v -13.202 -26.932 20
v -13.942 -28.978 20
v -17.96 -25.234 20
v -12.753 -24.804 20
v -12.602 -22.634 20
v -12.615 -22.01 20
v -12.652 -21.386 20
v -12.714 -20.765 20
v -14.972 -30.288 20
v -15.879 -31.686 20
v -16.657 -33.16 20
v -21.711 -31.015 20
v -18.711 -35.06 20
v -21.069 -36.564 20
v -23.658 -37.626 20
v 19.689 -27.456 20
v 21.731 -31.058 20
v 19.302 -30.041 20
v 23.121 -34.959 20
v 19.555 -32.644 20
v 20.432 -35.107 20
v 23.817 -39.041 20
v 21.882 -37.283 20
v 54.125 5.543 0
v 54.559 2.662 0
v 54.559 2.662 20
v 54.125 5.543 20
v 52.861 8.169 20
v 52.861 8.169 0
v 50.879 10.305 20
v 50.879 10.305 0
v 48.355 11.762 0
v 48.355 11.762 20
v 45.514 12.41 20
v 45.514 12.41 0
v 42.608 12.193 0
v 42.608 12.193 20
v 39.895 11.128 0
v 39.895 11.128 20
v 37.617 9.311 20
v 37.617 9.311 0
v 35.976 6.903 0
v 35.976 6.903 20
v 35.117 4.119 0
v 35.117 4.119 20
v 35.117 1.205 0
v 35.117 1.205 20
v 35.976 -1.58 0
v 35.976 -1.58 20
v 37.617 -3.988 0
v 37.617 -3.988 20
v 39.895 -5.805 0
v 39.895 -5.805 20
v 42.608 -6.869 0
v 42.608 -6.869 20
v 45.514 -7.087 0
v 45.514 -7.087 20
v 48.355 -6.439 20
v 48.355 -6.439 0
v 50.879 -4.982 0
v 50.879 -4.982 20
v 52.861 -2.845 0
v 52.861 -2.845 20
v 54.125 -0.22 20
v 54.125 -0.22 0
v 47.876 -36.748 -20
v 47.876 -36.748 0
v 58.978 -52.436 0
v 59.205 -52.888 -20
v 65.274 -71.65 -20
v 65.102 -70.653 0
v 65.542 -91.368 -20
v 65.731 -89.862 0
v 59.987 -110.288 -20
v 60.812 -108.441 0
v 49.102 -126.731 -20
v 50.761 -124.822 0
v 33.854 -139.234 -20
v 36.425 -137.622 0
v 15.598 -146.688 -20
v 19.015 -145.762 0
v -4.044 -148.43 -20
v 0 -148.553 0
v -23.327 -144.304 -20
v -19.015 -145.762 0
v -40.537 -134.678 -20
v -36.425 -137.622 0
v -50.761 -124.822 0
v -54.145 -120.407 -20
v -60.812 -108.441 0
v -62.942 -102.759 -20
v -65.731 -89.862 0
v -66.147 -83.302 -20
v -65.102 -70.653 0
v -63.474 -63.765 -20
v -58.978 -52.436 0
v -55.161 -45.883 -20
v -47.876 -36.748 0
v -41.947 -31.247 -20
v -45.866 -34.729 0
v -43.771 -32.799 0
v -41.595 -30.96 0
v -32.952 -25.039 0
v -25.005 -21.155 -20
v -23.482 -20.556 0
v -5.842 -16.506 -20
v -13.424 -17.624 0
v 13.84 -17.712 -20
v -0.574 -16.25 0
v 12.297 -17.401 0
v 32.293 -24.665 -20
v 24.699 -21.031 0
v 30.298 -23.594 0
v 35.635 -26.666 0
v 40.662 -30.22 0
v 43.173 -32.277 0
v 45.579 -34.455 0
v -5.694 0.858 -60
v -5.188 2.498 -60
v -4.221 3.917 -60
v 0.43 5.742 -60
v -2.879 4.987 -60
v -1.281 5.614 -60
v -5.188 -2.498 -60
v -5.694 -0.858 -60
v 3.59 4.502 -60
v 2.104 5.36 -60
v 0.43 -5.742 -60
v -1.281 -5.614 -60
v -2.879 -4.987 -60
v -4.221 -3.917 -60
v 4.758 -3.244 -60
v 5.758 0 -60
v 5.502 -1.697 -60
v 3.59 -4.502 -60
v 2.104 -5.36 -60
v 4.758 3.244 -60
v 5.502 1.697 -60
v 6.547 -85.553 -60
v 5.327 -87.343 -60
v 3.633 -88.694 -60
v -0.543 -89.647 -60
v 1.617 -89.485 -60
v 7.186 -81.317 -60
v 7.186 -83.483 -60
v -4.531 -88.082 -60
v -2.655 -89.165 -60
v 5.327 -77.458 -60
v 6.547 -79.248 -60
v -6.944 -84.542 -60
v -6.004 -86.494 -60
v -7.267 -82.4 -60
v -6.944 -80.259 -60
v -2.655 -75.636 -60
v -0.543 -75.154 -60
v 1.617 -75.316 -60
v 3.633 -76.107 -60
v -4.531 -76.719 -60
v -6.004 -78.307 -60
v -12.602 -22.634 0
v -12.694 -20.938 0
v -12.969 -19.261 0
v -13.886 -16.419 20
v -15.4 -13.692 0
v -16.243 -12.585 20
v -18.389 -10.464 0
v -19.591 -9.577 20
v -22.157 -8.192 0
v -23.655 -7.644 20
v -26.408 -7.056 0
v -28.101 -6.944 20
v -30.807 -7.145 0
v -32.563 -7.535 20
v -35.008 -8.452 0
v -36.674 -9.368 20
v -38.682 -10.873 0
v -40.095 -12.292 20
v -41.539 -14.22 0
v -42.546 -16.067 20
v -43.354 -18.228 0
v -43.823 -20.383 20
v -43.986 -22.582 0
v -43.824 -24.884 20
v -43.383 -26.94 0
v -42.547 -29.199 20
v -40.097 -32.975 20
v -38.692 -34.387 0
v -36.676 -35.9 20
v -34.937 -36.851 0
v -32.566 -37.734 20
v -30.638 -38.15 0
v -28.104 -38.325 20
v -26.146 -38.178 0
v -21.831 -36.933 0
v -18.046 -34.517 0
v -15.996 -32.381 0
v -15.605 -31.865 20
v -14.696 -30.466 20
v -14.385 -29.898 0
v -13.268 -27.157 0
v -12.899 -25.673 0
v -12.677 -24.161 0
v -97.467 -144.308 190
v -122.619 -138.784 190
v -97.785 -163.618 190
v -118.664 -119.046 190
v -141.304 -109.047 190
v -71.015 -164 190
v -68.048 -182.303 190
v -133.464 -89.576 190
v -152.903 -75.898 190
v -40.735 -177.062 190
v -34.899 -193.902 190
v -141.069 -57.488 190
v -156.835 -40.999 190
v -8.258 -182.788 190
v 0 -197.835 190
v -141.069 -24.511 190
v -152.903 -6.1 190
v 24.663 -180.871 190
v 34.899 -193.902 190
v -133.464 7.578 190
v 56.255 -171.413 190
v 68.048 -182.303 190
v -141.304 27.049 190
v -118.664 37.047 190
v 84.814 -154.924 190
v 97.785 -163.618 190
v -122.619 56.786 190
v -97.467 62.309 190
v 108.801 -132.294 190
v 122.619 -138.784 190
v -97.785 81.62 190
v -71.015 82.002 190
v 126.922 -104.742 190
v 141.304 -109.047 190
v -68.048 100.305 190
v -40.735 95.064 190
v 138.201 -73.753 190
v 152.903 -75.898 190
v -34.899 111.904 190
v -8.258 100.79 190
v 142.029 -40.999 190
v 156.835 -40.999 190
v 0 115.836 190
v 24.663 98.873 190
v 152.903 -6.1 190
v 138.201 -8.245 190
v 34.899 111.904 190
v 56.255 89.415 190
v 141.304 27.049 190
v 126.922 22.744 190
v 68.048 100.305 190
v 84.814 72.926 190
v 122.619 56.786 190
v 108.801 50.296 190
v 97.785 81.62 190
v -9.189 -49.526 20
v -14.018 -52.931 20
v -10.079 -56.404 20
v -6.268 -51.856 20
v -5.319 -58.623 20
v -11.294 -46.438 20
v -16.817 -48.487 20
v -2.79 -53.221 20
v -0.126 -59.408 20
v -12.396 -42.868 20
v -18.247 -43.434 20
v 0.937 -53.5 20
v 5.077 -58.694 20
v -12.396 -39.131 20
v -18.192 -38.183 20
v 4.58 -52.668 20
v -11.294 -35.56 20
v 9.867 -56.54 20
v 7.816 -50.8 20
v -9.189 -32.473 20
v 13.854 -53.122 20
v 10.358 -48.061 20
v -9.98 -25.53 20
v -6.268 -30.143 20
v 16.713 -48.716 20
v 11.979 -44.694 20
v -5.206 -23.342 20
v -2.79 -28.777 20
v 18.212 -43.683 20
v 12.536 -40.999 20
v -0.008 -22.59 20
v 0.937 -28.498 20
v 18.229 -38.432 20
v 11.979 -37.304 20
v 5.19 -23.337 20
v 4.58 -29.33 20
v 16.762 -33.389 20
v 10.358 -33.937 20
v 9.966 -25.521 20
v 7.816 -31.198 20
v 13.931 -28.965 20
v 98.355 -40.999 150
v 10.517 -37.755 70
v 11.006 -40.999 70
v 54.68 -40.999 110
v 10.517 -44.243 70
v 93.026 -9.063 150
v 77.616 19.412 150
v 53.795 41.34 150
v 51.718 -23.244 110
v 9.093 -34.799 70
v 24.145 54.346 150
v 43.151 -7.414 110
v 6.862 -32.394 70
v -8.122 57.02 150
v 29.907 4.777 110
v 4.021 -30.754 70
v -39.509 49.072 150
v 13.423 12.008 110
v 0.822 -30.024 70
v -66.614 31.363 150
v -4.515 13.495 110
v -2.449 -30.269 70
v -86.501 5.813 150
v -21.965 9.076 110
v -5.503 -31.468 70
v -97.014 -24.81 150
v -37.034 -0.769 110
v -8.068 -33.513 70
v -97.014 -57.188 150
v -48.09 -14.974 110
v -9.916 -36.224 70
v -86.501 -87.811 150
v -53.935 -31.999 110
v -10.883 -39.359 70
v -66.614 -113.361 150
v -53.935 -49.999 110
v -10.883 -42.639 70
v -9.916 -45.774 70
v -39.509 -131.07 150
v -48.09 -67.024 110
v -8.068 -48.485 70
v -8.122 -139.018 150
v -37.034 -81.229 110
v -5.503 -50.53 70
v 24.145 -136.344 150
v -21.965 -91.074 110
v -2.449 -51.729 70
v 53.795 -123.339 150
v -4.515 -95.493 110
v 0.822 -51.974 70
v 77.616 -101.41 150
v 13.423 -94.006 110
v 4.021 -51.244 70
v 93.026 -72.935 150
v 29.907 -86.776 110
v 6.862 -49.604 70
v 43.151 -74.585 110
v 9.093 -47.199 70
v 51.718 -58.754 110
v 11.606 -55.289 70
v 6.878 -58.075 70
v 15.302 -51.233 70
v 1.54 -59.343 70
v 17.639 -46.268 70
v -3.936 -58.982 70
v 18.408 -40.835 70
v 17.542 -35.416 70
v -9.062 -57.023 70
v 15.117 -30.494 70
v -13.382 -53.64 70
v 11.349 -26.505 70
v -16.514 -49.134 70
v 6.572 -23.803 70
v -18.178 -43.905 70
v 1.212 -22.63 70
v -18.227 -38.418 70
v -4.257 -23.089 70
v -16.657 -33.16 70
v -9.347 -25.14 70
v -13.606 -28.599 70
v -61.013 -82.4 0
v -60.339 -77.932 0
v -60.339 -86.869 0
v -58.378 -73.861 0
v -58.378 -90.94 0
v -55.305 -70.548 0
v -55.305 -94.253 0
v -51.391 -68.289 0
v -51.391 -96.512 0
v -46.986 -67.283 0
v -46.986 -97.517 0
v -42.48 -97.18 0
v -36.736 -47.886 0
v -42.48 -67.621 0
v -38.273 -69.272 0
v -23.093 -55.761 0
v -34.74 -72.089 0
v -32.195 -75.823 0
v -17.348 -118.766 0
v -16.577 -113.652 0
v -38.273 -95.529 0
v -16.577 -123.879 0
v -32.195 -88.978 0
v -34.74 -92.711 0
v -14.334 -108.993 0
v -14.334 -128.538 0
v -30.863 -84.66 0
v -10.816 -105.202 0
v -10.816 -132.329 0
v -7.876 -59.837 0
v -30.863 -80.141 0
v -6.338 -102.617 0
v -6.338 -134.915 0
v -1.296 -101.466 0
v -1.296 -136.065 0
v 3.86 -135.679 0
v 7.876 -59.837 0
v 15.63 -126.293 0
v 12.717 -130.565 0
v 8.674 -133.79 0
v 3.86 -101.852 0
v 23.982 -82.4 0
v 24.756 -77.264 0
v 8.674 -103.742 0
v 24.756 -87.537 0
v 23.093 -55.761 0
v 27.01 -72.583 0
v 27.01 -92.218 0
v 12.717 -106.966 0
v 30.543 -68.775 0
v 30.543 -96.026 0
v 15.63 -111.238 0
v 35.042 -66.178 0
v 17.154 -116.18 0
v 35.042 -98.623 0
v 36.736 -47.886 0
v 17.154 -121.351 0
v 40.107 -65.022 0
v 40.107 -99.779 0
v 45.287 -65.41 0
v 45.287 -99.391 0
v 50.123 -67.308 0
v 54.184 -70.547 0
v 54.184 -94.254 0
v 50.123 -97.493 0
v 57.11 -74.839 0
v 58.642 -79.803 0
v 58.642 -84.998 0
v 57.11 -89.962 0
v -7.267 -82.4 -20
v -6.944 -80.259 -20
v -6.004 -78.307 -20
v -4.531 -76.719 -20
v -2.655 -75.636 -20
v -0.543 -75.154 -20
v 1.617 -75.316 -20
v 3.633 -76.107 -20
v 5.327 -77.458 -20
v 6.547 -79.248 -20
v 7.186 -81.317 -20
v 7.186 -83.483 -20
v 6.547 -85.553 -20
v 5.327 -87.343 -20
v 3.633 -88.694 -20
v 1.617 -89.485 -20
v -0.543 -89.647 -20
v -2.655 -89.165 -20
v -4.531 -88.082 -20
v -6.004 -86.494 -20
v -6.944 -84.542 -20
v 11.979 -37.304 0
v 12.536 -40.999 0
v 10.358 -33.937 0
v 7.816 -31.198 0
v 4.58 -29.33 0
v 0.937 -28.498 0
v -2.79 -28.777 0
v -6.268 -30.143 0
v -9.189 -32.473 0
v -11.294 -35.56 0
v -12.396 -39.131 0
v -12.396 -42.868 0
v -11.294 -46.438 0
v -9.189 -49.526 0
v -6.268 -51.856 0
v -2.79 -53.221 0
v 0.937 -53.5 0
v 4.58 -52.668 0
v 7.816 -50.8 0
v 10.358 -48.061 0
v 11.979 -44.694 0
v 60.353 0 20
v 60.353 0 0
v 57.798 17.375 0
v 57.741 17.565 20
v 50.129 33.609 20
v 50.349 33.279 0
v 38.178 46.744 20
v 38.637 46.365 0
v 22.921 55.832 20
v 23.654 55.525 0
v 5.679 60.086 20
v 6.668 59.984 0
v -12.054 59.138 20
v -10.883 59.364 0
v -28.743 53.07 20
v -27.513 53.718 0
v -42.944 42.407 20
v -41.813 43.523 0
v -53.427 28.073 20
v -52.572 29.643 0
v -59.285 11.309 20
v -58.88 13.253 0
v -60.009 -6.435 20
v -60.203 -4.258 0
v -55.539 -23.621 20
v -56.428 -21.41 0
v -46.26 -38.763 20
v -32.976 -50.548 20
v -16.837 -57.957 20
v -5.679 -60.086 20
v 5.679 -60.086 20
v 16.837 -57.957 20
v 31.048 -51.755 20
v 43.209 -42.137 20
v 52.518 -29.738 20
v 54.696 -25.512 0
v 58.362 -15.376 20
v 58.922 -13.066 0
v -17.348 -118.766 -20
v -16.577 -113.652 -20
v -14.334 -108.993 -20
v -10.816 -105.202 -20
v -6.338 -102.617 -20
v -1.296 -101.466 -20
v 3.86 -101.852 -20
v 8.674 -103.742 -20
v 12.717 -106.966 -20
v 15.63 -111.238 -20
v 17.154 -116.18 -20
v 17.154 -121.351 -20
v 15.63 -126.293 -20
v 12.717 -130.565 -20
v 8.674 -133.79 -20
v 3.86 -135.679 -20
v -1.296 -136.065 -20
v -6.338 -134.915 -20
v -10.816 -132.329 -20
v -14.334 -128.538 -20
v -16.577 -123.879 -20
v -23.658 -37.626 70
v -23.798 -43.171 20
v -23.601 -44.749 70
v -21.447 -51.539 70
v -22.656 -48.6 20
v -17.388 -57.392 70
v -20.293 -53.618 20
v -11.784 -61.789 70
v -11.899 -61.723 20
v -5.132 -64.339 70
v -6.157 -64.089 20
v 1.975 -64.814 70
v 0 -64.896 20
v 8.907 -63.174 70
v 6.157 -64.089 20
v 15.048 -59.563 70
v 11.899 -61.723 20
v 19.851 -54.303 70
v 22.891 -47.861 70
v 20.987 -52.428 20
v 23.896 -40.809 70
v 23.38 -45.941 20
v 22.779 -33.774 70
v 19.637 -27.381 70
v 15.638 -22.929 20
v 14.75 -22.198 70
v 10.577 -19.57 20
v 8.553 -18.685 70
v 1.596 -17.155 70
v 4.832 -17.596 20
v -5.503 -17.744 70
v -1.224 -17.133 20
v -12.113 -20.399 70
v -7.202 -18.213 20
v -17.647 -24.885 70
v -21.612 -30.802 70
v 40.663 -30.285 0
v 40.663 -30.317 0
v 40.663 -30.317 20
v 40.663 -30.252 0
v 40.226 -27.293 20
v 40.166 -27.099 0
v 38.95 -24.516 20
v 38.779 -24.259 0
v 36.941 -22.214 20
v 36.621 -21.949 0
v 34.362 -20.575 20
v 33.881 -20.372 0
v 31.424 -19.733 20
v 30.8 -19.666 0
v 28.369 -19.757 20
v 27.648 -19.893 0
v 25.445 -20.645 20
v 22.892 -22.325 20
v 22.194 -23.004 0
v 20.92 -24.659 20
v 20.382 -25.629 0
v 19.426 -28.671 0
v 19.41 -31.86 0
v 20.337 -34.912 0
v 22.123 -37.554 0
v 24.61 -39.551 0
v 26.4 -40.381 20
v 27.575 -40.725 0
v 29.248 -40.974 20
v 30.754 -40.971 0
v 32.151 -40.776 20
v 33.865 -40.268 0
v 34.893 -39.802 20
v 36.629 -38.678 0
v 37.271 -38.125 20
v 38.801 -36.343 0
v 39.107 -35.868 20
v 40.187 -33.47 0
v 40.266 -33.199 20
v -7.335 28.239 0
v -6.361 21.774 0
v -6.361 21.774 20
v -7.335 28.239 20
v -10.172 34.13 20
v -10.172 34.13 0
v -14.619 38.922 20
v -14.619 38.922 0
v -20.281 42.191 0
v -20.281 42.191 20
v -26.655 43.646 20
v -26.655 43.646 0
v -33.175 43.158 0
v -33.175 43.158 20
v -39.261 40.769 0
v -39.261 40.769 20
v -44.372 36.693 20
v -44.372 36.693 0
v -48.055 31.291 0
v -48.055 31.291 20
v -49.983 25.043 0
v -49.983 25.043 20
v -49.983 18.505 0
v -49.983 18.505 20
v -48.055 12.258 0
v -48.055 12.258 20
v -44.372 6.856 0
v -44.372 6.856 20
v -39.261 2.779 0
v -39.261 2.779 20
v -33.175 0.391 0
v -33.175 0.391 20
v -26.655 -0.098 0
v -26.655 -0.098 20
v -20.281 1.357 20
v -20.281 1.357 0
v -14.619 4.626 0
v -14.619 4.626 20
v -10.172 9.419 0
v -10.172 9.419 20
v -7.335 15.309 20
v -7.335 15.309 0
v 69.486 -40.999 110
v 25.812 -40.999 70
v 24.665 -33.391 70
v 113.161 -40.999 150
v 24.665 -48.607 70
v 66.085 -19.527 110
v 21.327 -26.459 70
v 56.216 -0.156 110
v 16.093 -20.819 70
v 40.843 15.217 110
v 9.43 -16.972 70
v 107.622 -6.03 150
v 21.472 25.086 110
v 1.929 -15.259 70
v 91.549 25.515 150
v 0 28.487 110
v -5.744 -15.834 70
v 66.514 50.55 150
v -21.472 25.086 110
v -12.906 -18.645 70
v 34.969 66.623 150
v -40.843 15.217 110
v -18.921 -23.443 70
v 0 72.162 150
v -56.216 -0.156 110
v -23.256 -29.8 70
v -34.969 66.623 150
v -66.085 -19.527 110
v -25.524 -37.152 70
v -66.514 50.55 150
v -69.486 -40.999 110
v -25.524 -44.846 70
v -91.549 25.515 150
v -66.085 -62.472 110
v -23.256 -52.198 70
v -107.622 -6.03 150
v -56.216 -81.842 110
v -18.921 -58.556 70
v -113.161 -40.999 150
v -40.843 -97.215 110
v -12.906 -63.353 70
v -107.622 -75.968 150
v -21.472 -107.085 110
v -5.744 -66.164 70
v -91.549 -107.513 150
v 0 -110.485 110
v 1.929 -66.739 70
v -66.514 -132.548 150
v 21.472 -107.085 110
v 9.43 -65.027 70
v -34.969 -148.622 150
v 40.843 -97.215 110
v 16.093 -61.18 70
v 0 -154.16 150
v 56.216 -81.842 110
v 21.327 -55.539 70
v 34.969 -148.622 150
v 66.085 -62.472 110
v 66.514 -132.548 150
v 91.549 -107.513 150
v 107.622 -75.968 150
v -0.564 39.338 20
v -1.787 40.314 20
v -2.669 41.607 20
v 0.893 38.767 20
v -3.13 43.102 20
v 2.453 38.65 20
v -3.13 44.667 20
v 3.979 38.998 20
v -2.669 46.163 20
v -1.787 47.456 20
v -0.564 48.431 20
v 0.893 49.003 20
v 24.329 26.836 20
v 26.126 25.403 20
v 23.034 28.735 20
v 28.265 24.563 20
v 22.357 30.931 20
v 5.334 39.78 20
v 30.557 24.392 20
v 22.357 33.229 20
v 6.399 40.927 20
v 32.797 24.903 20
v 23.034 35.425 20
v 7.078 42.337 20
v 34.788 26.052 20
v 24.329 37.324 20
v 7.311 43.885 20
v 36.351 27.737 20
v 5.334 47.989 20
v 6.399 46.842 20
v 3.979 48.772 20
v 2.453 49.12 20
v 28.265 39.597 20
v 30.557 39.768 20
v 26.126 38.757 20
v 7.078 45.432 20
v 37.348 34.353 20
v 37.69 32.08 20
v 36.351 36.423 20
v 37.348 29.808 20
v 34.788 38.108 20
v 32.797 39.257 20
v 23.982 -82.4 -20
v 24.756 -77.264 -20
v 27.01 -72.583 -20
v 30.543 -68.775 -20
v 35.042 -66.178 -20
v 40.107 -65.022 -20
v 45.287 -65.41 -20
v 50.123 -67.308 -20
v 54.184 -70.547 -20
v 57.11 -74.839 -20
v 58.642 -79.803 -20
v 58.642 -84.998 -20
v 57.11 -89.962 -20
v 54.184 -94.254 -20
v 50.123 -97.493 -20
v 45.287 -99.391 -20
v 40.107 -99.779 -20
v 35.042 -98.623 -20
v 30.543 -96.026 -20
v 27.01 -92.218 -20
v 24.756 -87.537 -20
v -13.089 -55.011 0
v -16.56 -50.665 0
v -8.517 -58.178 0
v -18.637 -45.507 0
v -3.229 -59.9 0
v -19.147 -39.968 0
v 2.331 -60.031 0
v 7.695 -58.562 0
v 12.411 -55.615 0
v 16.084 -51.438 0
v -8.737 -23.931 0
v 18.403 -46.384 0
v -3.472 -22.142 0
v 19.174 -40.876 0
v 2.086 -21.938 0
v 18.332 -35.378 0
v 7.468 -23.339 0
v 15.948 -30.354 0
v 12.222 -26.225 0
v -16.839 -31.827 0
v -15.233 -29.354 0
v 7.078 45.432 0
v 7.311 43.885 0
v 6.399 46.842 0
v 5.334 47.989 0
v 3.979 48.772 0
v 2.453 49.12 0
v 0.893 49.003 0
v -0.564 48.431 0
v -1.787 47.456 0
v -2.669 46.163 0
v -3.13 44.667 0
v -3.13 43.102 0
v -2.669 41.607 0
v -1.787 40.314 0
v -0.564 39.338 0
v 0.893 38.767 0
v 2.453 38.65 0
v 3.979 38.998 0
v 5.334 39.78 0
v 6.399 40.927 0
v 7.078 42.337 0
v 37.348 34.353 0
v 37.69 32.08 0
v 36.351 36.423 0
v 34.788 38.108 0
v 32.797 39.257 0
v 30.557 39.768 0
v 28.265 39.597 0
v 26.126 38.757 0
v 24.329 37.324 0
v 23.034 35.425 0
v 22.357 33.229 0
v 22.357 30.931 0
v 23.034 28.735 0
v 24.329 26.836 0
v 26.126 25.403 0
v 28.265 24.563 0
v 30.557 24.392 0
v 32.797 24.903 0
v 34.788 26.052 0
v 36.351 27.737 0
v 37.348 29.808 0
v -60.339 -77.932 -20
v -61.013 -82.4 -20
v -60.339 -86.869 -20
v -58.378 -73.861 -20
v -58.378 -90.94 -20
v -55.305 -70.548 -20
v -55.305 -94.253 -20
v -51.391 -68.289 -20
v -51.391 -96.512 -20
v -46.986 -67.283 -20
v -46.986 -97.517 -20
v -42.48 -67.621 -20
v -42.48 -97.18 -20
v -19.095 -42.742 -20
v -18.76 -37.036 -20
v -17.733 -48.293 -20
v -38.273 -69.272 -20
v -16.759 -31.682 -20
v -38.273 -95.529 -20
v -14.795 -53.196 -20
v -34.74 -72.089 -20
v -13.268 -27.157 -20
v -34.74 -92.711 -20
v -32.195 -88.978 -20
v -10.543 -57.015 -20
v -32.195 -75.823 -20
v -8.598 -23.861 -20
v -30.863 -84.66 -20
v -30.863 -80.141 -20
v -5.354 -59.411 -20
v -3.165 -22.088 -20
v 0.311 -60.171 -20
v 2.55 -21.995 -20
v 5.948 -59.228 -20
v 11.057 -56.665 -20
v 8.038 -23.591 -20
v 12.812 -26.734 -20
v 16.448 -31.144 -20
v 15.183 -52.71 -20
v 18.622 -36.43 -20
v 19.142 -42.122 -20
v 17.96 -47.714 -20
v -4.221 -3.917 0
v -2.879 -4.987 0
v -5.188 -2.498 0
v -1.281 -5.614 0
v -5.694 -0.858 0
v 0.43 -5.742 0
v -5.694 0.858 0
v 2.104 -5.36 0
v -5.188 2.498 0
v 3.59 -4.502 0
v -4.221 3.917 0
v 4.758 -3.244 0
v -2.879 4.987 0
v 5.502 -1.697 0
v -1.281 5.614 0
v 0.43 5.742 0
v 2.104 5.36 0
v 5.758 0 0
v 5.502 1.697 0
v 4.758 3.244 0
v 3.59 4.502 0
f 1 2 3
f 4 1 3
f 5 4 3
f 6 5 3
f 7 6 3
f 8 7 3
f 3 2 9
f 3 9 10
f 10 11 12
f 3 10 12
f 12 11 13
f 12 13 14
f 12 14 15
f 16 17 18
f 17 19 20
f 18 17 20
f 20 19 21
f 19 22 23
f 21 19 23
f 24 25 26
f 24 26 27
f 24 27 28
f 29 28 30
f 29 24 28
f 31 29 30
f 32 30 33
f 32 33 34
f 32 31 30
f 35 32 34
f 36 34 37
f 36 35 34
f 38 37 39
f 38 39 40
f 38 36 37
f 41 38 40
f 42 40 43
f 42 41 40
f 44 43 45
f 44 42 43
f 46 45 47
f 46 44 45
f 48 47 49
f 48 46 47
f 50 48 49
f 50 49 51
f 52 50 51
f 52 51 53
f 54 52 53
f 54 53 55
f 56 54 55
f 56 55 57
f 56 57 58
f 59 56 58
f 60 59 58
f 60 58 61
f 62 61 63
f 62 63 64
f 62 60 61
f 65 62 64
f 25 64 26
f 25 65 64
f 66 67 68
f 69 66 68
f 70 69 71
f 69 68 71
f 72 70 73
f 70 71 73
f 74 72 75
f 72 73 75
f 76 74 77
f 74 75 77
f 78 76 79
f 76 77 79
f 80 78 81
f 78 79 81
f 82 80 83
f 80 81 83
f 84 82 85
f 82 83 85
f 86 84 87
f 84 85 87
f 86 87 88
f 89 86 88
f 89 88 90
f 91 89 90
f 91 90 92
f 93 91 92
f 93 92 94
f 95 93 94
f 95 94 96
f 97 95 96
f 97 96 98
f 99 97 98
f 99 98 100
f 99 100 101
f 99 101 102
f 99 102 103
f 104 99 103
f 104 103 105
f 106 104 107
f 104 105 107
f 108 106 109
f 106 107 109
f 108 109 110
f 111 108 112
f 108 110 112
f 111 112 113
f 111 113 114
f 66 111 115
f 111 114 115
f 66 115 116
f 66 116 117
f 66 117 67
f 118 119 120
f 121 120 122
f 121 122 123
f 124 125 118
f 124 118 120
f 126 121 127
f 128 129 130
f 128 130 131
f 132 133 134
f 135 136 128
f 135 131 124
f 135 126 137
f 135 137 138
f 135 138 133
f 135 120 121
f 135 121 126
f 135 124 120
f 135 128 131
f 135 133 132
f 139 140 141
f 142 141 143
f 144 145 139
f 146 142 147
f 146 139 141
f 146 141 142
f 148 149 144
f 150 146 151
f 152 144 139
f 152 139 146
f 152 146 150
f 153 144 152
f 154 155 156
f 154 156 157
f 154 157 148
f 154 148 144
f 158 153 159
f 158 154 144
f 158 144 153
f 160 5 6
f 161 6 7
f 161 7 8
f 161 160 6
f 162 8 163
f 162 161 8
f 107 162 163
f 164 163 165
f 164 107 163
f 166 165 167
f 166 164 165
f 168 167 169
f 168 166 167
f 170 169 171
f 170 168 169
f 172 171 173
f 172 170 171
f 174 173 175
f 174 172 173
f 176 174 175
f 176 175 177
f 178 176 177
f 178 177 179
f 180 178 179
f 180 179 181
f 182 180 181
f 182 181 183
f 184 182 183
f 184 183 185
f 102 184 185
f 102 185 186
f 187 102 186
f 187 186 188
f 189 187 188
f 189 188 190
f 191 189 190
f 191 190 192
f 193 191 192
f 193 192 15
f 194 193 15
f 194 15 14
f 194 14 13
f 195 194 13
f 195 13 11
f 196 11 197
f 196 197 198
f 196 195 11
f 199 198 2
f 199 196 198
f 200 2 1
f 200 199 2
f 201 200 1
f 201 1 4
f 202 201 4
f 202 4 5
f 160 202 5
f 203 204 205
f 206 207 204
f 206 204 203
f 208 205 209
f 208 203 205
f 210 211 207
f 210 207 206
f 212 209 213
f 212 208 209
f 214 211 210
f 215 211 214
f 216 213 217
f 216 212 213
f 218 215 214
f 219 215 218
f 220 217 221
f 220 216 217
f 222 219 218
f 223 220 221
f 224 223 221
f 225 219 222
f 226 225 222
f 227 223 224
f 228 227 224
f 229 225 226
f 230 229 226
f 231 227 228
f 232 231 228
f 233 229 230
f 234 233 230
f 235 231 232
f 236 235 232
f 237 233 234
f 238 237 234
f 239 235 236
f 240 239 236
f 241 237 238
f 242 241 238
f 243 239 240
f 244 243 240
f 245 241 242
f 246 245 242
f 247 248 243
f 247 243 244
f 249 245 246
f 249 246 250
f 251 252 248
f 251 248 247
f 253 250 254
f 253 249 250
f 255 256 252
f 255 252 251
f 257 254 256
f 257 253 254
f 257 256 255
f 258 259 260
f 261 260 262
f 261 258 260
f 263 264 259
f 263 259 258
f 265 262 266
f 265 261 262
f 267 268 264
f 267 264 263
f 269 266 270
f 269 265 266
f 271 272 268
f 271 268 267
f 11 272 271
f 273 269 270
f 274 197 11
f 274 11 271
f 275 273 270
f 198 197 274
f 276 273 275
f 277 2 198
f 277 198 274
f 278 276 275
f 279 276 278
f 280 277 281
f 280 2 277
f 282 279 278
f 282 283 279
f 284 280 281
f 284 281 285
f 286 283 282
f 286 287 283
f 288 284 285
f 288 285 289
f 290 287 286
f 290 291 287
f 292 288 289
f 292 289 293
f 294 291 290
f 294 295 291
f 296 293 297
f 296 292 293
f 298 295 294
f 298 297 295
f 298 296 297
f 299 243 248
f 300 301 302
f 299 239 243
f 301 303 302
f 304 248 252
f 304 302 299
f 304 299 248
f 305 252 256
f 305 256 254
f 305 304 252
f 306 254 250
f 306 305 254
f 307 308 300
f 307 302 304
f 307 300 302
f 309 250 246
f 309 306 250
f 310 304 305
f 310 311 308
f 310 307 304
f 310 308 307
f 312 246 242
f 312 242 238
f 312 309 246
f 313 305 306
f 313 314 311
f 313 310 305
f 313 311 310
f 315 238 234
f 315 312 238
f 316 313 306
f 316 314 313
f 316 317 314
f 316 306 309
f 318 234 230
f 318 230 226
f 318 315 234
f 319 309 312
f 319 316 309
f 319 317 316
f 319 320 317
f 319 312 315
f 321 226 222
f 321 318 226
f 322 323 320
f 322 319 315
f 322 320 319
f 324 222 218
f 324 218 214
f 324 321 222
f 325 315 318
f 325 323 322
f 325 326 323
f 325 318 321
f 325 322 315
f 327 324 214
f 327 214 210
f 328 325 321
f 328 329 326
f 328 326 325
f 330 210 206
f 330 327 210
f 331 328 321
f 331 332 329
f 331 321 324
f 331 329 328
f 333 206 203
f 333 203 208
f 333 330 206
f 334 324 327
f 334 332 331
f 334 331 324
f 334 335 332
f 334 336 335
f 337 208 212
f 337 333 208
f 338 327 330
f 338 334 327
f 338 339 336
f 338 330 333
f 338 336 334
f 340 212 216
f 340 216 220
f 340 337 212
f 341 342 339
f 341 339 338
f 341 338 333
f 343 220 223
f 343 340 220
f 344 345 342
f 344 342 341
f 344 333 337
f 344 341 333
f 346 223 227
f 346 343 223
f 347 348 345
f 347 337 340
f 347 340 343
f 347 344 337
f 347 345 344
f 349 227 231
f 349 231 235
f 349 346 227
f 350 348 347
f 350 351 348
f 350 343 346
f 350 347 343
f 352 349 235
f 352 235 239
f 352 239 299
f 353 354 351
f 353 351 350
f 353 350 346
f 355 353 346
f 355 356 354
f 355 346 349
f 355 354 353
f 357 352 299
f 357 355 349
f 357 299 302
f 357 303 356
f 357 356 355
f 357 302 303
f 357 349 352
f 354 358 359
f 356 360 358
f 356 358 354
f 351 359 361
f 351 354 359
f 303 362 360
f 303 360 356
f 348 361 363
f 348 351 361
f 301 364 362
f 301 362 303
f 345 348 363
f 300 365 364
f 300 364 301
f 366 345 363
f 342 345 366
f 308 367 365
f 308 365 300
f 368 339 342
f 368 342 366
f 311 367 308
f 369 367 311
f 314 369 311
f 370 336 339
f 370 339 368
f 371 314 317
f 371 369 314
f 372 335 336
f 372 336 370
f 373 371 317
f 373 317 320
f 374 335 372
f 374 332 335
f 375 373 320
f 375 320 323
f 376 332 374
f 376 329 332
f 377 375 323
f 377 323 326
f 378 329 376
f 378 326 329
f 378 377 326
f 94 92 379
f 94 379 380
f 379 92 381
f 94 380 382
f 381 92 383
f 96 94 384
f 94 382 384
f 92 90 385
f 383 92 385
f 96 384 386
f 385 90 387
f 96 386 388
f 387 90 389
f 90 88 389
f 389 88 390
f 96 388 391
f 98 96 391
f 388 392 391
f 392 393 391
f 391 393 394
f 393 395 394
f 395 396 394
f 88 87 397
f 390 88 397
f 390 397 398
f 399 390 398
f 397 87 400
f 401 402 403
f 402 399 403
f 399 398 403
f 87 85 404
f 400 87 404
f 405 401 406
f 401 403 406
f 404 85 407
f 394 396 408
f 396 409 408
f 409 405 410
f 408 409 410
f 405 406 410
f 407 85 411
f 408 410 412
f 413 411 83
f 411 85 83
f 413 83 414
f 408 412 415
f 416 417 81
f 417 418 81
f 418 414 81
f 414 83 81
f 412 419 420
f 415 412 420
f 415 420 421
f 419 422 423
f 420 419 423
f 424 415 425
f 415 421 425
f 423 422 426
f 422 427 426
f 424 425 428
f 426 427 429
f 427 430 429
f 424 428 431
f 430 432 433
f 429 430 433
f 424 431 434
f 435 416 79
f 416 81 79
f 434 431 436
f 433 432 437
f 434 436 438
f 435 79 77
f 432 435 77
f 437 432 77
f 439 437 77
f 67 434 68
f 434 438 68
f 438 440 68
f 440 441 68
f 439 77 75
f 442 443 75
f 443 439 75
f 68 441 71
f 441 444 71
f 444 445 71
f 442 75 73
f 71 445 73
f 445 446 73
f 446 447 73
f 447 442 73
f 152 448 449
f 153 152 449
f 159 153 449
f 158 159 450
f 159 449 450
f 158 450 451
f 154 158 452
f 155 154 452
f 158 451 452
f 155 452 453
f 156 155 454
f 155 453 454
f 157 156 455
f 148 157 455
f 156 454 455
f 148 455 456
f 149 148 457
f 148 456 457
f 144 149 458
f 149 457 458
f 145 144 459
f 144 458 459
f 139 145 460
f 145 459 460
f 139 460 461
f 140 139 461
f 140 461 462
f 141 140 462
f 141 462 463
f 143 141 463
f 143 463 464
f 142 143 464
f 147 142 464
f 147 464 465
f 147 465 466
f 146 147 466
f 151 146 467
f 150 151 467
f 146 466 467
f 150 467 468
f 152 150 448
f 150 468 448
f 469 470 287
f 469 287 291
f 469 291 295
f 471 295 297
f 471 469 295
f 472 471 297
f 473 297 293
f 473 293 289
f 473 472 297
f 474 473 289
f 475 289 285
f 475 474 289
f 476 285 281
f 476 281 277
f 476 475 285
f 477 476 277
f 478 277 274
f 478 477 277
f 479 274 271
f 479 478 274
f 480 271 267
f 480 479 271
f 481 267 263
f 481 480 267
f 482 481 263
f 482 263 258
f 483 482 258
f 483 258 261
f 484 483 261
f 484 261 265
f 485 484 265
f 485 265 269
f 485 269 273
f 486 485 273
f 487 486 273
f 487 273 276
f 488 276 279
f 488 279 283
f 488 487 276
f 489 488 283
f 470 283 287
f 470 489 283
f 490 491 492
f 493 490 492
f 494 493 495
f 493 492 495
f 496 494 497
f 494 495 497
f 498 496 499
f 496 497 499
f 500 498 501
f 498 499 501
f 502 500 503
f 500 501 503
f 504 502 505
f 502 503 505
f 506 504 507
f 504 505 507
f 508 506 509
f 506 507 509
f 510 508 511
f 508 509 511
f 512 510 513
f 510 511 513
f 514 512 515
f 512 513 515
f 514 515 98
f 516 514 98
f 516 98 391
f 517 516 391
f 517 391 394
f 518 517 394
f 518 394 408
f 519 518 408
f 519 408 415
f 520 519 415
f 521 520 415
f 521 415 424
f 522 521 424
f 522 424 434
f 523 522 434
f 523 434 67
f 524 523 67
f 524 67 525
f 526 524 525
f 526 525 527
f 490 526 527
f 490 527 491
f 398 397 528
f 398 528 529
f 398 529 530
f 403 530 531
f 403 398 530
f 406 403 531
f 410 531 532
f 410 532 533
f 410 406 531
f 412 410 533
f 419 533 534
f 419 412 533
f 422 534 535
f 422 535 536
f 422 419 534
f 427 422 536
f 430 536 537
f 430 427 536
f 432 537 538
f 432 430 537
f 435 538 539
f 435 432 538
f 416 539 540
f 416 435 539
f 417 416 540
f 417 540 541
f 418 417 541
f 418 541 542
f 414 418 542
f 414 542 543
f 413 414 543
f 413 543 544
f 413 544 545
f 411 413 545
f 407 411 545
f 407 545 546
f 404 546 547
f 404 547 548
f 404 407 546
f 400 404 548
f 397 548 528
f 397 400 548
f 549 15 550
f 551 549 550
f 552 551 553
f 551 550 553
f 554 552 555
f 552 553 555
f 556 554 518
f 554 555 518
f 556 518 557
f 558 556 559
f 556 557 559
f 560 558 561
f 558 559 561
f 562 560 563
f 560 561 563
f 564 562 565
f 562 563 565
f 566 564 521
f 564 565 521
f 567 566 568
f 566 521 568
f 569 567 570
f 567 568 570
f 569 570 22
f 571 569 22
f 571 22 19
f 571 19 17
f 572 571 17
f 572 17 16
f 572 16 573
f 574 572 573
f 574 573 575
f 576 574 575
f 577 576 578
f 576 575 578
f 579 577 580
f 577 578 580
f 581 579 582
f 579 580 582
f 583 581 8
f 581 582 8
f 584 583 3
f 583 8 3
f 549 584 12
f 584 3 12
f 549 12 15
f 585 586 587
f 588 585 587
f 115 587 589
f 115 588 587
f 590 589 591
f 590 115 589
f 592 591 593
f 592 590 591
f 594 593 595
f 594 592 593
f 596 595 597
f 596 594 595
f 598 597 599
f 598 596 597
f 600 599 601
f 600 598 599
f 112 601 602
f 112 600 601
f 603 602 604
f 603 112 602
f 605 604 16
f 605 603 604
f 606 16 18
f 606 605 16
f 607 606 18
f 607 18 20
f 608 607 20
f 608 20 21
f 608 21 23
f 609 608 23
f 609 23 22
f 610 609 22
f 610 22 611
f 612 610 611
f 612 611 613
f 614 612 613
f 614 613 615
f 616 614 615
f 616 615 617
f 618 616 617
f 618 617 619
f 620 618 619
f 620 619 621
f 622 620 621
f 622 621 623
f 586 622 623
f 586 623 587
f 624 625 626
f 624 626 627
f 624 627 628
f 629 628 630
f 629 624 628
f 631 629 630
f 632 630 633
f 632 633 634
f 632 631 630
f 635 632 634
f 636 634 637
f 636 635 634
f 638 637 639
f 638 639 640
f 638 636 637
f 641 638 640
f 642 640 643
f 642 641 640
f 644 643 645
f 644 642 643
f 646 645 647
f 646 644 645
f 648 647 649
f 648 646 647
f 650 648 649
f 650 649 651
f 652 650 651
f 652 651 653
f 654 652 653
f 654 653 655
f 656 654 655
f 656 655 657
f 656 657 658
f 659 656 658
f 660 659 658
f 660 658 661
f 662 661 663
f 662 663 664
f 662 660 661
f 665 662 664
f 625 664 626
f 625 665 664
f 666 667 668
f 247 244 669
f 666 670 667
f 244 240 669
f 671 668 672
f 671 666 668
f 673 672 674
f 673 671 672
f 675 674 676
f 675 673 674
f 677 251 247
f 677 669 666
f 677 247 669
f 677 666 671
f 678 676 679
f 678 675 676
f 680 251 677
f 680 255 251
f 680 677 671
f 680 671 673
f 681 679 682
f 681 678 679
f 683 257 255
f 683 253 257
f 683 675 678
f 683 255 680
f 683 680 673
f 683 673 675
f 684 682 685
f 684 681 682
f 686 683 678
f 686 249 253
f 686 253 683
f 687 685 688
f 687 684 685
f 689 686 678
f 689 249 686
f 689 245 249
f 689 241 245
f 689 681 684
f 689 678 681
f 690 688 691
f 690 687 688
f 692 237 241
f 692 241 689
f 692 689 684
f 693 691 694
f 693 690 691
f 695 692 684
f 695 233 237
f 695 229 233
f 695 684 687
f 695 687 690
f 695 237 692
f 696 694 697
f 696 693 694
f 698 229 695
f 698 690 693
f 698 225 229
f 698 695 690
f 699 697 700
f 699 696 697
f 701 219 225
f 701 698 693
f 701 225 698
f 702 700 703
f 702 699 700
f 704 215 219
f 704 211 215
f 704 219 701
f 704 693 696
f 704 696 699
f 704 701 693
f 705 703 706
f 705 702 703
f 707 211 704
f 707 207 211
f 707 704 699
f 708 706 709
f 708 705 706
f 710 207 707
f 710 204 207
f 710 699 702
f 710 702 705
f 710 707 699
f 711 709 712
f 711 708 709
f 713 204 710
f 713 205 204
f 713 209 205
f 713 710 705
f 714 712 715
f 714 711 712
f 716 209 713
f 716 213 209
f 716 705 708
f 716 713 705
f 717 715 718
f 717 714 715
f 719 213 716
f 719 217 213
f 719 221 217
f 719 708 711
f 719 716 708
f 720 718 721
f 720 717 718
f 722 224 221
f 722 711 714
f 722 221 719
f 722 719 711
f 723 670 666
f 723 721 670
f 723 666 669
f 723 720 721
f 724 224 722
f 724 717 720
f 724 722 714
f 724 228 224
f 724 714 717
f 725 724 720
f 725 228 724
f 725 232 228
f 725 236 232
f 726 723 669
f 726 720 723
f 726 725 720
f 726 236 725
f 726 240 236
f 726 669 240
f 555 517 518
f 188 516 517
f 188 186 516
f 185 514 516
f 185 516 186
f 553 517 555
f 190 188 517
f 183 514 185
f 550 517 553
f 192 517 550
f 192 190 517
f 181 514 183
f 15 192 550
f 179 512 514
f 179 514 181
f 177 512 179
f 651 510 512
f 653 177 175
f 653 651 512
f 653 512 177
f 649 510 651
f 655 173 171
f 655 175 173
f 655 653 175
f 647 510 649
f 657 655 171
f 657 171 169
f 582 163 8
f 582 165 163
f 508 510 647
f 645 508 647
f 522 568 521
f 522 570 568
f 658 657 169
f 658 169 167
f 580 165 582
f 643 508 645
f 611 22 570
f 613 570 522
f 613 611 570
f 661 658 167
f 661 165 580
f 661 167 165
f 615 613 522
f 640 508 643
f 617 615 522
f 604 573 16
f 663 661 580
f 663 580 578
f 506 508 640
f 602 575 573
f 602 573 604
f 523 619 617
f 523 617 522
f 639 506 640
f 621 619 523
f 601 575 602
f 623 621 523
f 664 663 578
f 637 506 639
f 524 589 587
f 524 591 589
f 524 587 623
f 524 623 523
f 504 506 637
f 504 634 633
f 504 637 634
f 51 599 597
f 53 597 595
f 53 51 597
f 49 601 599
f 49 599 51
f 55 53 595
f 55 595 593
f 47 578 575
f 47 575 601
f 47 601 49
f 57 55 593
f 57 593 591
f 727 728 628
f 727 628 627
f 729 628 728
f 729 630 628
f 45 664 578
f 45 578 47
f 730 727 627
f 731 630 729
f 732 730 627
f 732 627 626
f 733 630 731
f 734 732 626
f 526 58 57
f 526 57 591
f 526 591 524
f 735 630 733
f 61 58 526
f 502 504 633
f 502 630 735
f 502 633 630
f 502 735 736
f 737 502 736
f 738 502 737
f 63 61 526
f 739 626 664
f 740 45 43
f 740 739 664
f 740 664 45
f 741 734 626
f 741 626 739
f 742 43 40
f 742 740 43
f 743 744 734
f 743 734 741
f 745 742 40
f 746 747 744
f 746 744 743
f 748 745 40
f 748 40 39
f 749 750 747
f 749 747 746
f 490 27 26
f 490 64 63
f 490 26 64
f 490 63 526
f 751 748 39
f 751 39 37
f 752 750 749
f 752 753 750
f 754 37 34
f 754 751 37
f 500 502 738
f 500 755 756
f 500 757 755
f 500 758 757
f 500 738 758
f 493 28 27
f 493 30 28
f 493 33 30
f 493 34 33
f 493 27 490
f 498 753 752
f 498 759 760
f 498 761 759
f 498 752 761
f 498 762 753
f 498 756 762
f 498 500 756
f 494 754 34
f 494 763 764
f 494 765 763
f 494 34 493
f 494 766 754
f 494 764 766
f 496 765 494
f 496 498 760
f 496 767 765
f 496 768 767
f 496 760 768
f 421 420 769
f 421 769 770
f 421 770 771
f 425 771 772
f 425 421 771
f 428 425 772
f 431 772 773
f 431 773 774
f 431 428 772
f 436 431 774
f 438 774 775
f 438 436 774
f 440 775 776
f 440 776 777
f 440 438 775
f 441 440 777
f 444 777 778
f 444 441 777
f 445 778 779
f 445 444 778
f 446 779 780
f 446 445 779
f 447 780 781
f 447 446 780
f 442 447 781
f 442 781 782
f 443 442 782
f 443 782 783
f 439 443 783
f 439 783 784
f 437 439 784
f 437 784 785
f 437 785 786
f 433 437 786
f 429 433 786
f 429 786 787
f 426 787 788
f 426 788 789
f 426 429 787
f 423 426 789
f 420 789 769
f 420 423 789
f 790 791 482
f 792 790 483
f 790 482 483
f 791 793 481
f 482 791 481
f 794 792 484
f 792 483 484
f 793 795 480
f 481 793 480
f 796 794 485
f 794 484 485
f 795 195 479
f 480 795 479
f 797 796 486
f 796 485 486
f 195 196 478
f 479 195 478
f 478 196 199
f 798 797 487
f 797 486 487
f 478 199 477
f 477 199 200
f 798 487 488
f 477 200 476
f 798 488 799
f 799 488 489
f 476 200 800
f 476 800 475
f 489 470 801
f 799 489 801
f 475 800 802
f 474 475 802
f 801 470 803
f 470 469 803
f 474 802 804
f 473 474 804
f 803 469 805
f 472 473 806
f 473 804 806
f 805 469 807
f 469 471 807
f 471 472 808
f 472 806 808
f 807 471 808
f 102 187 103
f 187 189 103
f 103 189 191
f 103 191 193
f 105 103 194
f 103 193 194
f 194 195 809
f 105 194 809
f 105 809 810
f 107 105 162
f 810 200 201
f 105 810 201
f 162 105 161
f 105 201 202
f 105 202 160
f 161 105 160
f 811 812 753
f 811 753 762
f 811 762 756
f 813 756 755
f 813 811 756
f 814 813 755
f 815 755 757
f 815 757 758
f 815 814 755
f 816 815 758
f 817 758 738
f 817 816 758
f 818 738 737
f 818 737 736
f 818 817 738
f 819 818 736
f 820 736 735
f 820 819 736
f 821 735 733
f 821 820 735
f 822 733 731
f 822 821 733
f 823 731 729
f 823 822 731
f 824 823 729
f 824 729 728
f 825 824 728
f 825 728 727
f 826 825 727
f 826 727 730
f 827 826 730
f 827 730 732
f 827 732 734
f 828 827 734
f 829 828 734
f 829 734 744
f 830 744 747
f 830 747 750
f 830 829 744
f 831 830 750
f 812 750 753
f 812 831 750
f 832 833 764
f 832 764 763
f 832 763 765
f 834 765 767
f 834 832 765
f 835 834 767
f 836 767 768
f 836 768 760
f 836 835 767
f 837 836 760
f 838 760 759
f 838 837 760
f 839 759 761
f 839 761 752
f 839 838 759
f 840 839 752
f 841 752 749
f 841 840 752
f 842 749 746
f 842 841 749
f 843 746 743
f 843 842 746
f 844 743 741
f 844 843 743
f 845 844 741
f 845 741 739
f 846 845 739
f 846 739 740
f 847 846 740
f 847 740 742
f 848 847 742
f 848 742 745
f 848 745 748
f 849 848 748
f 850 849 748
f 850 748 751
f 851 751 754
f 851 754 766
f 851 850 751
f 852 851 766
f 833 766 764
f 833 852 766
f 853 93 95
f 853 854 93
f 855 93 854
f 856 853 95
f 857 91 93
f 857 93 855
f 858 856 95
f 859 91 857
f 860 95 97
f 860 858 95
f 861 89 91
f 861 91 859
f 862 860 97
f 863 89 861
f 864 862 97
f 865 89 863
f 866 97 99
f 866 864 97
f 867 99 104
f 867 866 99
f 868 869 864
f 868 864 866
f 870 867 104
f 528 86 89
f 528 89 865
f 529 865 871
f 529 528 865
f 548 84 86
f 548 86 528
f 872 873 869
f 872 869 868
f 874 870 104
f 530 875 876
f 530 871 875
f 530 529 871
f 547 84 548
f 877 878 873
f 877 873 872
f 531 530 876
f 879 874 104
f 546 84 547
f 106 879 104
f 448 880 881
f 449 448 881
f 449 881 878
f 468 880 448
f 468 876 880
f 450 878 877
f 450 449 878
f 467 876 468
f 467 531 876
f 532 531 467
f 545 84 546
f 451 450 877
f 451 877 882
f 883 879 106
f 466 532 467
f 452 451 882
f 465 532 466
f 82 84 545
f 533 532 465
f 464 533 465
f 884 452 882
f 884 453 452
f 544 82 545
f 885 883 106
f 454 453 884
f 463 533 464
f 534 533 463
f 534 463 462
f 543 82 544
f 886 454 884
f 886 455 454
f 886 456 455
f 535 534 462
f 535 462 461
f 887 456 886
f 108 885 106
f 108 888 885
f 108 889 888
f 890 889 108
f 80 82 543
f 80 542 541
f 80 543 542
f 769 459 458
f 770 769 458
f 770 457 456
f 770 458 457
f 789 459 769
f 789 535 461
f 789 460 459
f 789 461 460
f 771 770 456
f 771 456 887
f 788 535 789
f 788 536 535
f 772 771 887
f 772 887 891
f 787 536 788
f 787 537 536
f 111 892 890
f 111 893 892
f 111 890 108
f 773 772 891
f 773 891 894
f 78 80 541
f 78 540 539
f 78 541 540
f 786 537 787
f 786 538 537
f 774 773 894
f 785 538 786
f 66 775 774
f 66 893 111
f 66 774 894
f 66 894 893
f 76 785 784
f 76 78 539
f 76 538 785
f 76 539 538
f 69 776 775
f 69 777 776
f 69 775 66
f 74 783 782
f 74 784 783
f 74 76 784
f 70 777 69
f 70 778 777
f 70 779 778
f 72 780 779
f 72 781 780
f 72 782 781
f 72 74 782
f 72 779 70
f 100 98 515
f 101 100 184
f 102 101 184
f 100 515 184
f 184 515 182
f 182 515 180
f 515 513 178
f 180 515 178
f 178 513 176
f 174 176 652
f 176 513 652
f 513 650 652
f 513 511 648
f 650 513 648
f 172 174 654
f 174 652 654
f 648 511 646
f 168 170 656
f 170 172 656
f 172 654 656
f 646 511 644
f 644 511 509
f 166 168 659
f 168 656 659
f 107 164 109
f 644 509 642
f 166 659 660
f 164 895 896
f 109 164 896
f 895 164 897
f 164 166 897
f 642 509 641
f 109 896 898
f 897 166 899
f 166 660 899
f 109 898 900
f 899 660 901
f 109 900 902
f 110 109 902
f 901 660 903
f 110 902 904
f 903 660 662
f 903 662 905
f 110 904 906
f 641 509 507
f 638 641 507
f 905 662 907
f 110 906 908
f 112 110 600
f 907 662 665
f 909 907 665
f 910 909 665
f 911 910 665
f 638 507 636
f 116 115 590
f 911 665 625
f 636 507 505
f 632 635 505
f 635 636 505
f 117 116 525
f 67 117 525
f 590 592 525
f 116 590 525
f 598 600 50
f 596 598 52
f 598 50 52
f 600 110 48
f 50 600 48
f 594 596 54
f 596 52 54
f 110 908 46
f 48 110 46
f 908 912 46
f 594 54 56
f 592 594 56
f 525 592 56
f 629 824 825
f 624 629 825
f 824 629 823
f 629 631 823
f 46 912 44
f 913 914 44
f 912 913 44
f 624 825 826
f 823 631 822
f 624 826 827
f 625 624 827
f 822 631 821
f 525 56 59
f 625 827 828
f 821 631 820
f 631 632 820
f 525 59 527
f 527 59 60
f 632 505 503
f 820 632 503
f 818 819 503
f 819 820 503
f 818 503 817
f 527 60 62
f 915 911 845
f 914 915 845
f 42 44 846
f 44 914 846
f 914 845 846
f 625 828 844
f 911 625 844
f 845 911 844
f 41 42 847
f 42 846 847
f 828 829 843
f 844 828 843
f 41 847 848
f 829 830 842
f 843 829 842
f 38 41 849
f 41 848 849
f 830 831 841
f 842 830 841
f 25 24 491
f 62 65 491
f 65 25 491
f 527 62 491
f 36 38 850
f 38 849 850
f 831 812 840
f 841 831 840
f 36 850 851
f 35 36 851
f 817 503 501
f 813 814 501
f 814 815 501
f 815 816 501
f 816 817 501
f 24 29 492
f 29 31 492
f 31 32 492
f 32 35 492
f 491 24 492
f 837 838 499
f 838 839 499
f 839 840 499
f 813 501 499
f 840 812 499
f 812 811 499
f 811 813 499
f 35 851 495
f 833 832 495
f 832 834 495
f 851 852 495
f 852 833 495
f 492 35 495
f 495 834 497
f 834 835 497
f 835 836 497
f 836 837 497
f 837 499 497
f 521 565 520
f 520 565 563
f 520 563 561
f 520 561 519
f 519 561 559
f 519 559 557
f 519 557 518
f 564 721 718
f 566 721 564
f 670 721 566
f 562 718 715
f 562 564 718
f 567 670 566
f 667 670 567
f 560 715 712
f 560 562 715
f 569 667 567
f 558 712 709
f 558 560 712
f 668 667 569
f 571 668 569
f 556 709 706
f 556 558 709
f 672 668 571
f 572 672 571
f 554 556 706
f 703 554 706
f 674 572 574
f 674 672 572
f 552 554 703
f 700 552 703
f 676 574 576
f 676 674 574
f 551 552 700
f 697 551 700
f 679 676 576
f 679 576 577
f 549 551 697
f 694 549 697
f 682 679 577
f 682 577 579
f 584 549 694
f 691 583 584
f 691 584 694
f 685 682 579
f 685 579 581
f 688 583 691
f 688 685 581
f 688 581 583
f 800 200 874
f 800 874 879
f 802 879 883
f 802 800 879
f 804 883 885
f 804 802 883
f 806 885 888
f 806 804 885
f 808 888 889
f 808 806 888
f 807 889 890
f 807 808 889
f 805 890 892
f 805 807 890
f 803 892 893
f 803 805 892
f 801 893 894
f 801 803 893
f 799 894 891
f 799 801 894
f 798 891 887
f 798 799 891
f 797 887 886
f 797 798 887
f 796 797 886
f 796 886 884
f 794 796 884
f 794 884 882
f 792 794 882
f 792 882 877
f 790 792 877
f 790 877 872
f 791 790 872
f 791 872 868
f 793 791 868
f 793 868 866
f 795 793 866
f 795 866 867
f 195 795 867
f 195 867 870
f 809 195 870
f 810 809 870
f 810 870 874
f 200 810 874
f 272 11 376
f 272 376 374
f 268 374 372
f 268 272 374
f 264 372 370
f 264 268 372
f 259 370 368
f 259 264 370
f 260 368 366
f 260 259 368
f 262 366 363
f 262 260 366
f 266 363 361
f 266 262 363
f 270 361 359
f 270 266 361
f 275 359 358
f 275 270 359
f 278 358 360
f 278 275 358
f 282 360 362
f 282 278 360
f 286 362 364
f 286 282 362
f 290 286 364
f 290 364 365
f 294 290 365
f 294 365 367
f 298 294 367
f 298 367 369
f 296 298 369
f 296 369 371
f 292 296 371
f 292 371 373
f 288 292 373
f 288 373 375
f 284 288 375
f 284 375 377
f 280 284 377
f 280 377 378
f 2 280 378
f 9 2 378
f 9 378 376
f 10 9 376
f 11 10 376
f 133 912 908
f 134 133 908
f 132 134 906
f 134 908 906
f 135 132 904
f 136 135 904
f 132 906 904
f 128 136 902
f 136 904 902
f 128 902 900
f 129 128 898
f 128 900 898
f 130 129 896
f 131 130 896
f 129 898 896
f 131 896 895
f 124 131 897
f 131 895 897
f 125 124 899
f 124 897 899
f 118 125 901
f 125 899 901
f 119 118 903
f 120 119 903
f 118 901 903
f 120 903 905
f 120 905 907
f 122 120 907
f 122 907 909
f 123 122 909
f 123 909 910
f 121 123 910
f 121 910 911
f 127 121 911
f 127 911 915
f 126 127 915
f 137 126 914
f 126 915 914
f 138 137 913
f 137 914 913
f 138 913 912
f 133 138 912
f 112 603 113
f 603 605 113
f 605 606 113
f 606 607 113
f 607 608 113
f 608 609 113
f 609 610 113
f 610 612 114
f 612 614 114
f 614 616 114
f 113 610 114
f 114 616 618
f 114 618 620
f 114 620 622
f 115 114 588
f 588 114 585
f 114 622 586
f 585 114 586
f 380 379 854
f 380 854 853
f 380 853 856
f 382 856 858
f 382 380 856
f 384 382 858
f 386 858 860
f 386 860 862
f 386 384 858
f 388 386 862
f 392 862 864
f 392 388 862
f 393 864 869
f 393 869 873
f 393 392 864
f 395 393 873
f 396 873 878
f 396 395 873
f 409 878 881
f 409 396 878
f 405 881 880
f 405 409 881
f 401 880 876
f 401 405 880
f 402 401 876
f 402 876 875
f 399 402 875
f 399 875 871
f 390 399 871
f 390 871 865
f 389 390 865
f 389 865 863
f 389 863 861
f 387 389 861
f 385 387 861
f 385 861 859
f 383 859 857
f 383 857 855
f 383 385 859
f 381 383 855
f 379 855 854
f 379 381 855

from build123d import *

# Parameters (mm, degrees)
SKETCH_1_R      = 60.353493774
SKETCH_1_R_2    = 5.249937669
SKETCH_1_R_3    = 7.709883183
SKETCH_1_R_4    = 9.776049215
SKETCH_1_R_5    = 10.682207241
SKETCH_1_R_6    = 12.535934249
SKETCH_1_R_7    = 15.691744865
SKETCH_1_R_8    = 21.933378779
EXTRUDE_1_DEPTH = 20
SKETCH_2_R      = 23.897110151
SKETCH_2_R_2    = 18.408818548
EXTRUDE_2_DEPTH = 50
SKETCH_5_R      = 5.758247264
EXTRUDE_3_DEPTH = 60
SKETCH_6_R      = 66.152888952
SKETCH_6_R_2    = 19.174469575
SKETCH_6_R_3    = 15.159489644
SKETCH_6_R_4    = 17.427329396
SKETCH_6_R_5    = 17.348205871
EXTRUDE_4_DEPTH = 20
SKETCH_7_R      = 7.266662744
EXTRUDE_5_DEPTH = 40


# Read off the part's stored shape, not the designer's step: 放样-薄件1
with BuildPart() as part:
    # 草图1 → 凸台-拉伸1 (new body)
    with BuildSketch(Plane.XY):
        Circle(SKETCH_1_R)
        with Locations((2.061161415, 43.884893492)):
            Circle(SKETCH_1_R_2, mode=Mode.SUBTRACT)
        with Locations((29.98052968, 32.080059931)):
            Circle(SKETCH_1_R_3, mode=Mode.SUBTRACT)
        with Locations((44.783416209, 2.661665183)):
            Circle(SKETCH_1_R_4, mode=Mode.SUBTRACT)
        with Locations((29.98052968, -30.316917465)):
            Circle(SKETCH_1_R_5, mode=Mode.SUBTRACT)
        with Locations((0, -40.999124706)):
            Circle(SKETCH_1_R_6, mode=Mode.SUBTRACT)
        with Locations((-28.294124885, -22.634406734)):
            Circle(SKETCH_1_R_7, mode=Mode.SUBTRACT)
        with Locations((-28.294124885, 21.774252854)):
            Circle(SKETCH_1_R_8, mode=Mode.SUBTRACT)
    extrude(amount=EXTRUDE_1_DEPTH)

    # 草图2 → 凸台-拉伸2 (add)
    with BuildSketch(Plane.XY.offset(20)):
        with Locations(Location((0, -40.999124706, 0), (0, 0, 171.88446927))):
            Circle(SKETCH_2_R)
        with Locations(Location((0, -40.999124706, 0), (0, 0, 154.797833564))):
            Circle(SKETCH_2_R_2, mode=Mode.SUBTRACT)
    extrude(amount=EXTRUDE_2_DEPTH)

    # 放样-薄件1 outline → 放样-薄件1 (revolve)
    with BuildSketch(Plane.XZ.offset(40.999124706)):
        Polygon((142.029499723, 190), (11.005834825, 70), (25.81180227, 70), (156.835467167, 190), align=None)
    revolve(axis=Axis((0, -40.999124706, 0), (0, 0, 1)))

    # 草图5 → 凸台-拉伸3 (add)
    with BuildSketch(Plane(origin=(0, 0, 0), x_dir=(-1, 0, 0), z_dir=(0, 0, -1))):
        with Locations(Location((0, 0, 0), (0, 0, 180))):
            Circle(SKETCH_5_R)
    extrude(amount=EXTRUDE_3_DEPTH)

    # 草图6 → 凸台-拉伸4 (add)
    with BuildSketch(Plane(origin=(0, 0, 0), x_dir=(-1, 0, 0), z_dir=(0, 0, -1))):
        with Locations(Location((0, -82.400396549, 0), (0, 0, 136.362104422))):
            Circle(SKETCH_6_R)
        with Locations(Location((0, -40.999124706, 0), (0, 0, 46.213976219))):
            Circle(SKETCH_6_R_2, mode=Mode.SUBTRACT)
        with Locations((45.85301636, -82.400396549)):
            Circle(SKETCH_6_R_3, mode=Mode.SUBTRACT)
        with Locations((-41.408908427, -82.400396549)):
            Circle(SKETCH_6_R_4, mode=Mode.SUBTRACT)
        with Locations((0, -118.765519068)):
            Circle(SKETCH_6_R_5, mode=Mode.SUBTRACT)
    extrude(amount=EXTRUDE_4_DEPTH)

    # 草图7 → 凸台-拉伸5 (add)
    with BuildSketch(Plane(origin=(0, 0, -20), x_dir=(-1, 0, 0), z_dir=(0, 0, -1))):
        with Locations((0, -82.400396549)):
            Circle(SKETCH_7_R)
    extrude(amount=EXTRUDE_5_DEPTH)


solid = part.part
